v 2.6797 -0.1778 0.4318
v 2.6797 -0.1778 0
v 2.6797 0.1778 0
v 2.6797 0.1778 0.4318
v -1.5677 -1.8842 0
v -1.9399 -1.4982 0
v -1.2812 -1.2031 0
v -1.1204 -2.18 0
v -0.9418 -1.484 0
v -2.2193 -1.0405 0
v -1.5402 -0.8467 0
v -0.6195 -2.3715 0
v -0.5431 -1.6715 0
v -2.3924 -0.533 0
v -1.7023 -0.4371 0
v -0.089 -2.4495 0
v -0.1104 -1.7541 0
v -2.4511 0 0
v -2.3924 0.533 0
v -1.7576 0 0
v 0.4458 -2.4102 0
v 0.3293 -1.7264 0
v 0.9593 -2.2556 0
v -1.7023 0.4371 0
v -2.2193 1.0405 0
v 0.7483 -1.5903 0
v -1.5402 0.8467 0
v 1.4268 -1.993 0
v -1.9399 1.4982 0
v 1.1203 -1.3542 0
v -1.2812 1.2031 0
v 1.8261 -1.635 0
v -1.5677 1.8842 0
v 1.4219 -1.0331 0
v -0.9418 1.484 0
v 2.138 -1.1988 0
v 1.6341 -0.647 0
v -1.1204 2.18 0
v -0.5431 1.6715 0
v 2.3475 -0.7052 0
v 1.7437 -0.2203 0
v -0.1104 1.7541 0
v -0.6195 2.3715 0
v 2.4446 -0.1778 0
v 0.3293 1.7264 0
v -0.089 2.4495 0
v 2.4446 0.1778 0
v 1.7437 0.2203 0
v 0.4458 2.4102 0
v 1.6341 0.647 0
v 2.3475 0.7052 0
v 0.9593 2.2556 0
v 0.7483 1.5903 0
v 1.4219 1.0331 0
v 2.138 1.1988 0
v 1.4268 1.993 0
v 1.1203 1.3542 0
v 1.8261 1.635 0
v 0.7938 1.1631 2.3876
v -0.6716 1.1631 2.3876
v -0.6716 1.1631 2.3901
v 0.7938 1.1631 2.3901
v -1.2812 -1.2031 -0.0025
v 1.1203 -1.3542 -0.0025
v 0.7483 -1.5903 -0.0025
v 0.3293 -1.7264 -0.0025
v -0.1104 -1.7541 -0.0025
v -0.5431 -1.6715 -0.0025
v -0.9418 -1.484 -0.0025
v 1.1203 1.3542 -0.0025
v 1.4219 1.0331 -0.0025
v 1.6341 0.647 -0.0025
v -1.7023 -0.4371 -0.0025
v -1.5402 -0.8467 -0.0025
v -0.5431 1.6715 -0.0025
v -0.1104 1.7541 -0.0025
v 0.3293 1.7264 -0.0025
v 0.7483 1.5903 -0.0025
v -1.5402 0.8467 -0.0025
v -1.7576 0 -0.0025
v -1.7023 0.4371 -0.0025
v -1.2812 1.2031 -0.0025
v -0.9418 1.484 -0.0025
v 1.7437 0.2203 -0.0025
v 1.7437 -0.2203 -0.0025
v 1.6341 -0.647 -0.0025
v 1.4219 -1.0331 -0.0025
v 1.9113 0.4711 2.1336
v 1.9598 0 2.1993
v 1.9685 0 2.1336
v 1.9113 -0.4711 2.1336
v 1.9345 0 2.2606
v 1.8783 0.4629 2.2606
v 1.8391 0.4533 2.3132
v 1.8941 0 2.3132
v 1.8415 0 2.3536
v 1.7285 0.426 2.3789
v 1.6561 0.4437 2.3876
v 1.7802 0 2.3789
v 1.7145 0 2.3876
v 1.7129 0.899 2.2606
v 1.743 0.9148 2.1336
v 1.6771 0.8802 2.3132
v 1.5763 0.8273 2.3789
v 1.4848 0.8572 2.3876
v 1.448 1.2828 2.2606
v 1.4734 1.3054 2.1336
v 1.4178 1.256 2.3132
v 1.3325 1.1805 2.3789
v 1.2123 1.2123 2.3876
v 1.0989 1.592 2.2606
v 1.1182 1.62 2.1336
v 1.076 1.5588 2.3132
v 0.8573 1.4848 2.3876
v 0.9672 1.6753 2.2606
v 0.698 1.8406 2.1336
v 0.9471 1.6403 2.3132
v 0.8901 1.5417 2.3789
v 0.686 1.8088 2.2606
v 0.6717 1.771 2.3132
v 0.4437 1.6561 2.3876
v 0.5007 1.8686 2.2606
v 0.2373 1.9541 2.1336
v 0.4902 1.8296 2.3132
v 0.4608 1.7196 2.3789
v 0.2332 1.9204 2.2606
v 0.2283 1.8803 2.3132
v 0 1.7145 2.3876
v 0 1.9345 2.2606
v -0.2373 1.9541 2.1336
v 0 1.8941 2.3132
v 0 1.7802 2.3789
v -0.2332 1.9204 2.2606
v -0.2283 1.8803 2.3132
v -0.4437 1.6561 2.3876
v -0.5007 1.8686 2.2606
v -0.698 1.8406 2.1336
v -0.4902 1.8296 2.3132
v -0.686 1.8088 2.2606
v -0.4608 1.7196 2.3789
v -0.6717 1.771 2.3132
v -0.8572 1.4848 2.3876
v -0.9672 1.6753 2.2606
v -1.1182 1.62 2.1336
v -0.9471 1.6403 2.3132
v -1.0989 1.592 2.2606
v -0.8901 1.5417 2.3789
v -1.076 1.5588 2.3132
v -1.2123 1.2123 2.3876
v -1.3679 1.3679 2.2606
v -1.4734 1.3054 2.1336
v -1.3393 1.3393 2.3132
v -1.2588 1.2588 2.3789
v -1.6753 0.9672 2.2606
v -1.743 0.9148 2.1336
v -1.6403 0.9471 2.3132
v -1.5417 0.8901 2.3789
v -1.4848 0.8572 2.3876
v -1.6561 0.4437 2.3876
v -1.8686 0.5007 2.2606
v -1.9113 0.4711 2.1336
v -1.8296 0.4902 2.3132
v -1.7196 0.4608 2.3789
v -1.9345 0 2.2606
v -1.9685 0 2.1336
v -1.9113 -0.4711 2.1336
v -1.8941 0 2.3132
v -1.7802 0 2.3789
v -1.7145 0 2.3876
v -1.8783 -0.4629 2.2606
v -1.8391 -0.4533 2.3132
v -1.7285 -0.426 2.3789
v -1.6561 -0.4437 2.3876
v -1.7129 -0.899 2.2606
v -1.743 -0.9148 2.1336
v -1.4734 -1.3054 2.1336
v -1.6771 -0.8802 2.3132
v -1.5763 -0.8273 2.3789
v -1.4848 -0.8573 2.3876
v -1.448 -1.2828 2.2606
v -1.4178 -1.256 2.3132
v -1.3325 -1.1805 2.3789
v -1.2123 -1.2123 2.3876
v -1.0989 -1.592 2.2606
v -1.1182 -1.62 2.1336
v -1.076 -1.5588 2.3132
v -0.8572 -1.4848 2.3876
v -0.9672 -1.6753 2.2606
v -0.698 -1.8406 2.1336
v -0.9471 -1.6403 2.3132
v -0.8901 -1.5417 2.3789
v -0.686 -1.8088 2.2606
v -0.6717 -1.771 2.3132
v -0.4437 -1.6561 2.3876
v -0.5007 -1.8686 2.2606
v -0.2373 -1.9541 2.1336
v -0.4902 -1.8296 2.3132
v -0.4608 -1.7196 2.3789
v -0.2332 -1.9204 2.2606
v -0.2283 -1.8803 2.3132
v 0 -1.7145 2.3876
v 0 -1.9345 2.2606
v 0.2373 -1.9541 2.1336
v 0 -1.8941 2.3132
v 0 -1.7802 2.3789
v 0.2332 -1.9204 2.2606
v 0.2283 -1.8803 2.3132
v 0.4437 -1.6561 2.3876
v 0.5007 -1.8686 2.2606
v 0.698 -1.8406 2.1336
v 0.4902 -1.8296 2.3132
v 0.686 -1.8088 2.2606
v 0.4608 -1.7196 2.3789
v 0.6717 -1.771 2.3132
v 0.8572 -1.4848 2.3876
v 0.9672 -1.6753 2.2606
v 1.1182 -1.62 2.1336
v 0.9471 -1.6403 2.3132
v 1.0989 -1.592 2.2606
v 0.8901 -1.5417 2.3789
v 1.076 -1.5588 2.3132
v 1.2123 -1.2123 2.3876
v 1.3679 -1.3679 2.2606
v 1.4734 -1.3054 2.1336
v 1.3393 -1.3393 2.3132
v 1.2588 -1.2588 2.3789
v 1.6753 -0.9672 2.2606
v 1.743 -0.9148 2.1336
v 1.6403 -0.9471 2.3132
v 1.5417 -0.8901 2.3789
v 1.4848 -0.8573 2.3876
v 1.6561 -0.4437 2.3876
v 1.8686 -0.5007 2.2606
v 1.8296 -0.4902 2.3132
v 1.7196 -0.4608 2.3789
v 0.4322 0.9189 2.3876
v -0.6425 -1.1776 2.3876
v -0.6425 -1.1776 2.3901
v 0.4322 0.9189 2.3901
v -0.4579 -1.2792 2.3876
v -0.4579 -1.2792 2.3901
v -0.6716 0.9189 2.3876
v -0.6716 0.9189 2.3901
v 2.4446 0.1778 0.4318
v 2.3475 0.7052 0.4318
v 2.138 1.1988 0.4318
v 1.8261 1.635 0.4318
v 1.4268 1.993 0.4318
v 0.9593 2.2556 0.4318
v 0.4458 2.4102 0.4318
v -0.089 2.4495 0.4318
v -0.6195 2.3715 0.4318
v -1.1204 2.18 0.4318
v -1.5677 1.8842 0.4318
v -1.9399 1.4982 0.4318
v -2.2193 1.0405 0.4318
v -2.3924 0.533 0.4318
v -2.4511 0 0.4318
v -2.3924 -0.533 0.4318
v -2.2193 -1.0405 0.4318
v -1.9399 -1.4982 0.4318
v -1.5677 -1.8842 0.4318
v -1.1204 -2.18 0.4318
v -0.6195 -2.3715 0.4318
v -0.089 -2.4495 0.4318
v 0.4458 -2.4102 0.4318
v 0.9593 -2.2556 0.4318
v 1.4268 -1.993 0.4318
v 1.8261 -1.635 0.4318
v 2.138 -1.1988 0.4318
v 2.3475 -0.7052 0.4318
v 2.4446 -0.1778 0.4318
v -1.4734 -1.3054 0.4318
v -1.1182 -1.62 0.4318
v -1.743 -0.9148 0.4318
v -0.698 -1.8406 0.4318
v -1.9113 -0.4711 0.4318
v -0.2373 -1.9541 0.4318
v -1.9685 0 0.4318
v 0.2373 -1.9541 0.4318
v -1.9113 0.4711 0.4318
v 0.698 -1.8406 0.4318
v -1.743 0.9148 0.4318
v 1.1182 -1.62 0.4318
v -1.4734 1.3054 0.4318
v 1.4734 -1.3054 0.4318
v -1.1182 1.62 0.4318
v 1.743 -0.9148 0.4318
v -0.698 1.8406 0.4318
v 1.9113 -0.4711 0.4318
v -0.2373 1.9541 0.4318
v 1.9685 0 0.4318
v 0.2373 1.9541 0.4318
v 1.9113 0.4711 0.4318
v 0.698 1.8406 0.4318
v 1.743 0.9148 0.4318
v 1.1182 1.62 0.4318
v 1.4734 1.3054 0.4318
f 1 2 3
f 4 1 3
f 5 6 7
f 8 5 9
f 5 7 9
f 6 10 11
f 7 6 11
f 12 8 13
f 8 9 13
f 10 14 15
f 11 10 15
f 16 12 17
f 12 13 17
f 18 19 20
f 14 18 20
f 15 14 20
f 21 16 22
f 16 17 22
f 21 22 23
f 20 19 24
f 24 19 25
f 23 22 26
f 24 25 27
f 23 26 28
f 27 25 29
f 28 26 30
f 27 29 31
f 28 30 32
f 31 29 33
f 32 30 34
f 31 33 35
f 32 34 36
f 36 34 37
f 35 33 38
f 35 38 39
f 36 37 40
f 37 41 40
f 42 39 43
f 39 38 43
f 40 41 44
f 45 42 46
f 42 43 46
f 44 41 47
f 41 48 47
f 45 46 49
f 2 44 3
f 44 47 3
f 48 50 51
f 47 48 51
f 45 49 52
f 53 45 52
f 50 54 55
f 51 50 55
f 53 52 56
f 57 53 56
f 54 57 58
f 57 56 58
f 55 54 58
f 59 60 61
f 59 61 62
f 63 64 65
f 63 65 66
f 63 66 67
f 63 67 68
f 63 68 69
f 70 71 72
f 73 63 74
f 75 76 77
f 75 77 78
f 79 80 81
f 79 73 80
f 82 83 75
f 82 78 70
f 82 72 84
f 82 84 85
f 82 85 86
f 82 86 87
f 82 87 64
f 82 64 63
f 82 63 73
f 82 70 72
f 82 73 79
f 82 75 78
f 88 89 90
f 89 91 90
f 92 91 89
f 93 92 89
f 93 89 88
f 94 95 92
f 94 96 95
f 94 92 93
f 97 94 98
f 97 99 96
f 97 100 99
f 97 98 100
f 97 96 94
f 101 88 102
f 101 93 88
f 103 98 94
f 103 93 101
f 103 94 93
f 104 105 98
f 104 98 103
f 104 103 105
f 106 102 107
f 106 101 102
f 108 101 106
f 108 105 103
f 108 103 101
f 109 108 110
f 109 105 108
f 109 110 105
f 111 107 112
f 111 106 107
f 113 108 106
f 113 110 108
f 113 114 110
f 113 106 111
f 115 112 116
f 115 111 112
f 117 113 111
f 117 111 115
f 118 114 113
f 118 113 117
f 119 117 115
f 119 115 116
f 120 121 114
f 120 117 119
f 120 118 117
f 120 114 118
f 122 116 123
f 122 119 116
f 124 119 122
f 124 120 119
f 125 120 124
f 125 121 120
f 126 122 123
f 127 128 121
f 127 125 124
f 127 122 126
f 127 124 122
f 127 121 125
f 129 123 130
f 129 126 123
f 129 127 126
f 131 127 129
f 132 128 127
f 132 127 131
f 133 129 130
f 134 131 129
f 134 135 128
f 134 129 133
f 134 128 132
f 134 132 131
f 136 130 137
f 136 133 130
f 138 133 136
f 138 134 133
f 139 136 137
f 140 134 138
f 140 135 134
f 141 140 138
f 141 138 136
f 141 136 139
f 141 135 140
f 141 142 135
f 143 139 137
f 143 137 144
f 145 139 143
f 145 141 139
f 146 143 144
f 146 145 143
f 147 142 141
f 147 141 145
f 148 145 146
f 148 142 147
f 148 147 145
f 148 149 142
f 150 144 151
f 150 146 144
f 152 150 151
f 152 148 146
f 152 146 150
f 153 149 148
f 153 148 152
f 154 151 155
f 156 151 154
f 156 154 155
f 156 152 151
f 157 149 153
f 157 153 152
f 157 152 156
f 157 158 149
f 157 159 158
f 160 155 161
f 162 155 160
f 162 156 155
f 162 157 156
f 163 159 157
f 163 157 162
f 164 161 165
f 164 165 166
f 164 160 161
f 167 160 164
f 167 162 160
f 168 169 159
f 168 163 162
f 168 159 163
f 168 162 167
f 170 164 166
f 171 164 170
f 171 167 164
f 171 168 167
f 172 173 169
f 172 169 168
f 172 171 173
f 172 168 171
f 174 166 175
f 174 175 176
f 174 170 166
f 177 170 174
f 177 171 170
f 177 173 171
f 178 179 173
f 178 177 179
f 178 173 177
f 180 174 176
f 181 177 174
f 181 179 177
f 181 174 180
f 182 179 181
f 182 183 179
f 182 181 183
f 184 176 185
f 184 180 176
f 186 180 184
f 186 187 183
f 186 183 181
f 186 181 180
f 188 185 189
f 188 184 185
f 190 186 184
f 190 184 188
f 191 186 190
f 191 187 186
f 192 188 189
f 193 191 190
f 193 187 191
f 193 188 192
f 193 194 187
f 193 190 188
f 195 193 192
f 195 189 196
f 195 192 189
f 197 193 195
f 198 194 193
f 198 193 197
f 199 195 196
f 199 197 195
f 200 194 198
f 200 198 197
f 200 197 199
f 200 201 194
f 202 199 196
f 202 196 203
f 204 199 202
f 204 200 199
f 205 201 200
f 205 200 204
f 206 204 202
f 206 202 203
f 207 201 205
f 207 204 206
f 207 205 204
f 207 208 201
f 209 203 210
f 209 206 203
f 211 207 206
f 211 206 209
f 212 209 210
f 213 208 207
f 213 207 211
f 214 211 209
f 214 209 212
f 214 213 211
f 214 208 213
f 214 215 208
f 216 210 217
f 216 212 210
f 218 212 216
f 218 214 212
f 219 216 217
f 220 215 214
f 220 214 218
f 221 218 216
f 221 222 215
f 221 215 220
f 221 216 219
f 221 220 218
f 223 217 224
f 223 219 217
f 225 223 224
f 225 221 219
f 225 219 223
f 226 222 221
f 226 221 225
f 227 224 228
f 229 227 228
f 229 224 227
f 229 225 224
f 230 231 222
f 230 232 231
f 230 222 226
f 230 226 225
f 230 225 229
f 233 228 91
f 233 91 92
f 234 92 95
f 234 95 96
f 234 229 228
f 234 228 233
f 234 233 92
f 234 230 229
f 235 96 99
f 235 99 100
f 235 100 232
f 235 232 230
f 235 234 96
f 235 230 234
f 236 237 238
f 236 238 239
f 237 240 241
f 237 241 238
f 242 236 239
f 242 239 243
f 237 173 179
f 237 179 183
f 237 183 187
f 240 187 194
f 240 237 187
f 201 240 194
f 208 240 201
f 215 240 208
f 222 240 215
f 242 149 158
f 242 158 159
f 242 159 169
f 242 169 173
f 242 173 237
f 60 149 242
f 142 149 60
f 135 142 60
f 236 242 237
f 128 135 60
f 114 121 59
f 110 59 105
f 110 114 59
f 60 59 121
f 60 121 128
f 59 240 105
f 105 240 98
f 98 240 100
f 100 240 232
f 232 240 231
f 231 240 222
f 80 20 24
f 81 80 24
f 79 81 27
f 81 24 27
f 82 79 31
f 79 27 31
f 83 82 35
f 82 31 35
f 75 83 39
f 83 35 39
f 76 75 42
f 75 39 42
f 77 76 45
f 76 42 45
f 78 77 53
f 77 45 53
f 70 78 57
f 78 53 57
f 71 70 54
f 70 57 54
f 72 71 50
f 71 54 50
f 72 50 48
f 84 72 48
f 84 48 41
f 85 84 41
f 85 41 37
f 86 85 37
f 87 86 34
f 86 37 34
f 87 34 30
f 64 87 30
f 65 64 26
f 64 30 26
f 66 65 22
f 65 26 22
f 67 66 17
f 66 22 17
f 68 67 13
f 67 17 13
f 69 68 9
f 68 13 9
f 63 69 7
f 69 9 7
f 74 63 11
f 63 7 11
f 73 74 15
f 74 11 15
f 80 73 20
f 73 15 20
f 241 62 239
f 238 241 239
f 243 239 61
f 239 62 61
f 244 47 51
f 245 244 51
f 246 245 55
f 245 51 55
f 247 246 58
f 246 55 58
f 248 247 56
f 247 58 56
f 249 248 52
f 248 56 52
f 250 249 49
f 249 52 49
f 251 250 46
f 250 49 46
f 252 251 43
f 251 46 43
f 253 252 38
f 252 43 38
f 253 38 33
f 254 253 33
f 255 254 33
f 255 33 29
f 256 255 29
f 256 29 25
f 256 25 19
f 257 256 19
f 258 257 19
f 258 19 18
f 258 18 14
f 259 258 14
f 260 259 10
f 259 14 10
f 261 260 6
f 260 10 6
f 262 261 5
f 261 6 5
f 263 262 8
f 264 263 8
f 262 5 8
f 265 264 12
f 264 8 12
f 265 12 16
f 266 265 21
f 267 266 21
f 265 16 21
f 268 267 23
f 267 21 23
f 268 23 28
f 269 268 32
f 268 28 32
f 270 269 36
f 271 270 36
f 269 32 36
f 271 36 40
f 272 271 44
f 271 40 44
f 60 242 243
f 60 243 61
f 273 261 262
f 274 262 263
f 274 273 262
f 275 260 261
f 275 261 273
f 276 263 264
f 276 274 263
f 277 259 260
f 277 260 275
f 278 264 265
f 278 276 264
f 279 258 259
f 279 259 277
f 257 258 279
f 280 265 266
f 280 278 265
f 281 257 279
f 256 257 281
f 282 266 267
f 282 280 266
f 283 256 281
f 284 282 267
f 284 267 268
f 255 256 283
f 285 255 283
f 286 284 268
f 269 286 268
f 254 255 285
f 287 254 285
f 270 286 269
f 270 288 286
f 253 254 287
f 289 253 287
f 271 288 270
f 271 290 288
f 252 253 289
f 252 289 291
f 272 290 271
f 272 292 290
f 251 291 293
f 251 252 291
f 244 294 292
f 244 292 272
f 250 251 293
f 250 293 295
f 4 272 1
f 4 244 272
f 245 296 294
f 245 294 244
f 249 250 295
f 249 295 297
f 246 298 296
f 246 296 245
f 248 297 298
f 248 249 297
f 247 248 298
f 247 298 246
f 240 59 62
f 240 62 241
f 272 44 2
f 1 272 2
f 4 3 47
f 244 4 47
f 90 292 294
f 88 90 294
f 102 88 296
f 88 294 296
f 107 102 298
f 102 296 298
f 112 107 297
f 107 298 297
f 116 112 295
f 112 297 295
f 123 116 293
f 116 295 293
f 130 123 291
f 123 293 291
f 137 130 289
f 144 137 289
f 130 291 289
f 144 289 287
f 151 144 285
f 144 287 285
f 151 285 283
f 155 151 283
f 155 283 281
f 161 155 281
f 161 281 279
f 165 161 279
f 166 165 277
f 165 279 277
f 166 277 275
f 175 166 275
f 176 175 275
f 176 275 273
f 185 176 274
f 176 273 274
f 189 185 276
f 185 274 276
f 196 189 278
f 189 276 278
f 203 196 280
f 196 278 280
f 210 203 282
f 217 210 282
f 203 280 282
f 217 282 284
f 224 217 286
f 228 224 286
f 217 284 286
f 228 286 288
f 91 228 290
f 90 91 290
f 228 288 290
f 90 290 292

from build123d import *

# Parameters (mm, degrees)
BOSS_EXTRUDE1_DEPTH = 0.4318
SKETCH2_R           = 1.9685
BOSS_EXTRUDE2_DEPTH = 1.9558
SKETCH3_R           = 1.757566481
BOSS_EXTRUDE3_DEPTH = 0.00254
FILLET1_R           = 0.254
BOSS_EXTRUDE6_DEPTH = 0.00254


with BuildPart() as part:
    # Sketch1 → Boss-Extrude1 (new body)
    with BuildSketch(Plane.XY):
        with BuildLine():
            Line((2.6797, 0.1778), (2.4511, 0.1778))
            Line((2.4511, 0.1778), (2.44464279, 0.1778))
            ThreePointArc((2.44464279, 0.1778), (-2.4511, 0), (2.44464279, -0.1778))
            Line((2.44464279, -0.1778), (2.4511, -0.1778))
            Line((2.4511, -0.1778), (2.6797, -0.1778))
            Line((2.6797, -0.1778), (2.6797, 0.1778))
        make_face()
    extrude(amount=BOSS_EXTRUDE1_DEPTH)

    # Sketch2 → Boss-Extrude2 (add)
    with BuildSketch(Plane.XY.offset(0.4318)):
        Circle(SKETCH2_R)
    extrude(amount=BOSS_EXTRUDE2_DEPTH)

    # Sketch3 → Boss-Extrude3 (add)
    with BuildSketch(Plane(origin=(0, 0, 0), x_dir=(-1, 0, 0), z_dir=(0, 0, -1))):
        Circle(SKETCH3_R)
    extrude(amount=BOSS_EXTRUDE3_DEPTH)

    # Fillet1
    fillet1_edges = [part.edges().sort_by_distance(p)[0] for p in [
        (-1.9685, 0, 2.3876),
    ]]
    fillet(fillet1_edges, radius=FILLET1_R)

    # Sketch4 → Boss-Extrude6 (add)
    with BuildSketch(Plane.XY.offset(2.3876)):
        Polygon((-0.671634615, 1.163108793), (0.79375, 1.163108793), (-0.457932692, -1.279198899), (-0.642536809, -1.177595083), (0.432173978, 0.918878024), (-0.671634615, 0.918878024), align=None)
    extrude(amount=BOSS_EXTRUDE6_DEPTH)


solid = part.part
